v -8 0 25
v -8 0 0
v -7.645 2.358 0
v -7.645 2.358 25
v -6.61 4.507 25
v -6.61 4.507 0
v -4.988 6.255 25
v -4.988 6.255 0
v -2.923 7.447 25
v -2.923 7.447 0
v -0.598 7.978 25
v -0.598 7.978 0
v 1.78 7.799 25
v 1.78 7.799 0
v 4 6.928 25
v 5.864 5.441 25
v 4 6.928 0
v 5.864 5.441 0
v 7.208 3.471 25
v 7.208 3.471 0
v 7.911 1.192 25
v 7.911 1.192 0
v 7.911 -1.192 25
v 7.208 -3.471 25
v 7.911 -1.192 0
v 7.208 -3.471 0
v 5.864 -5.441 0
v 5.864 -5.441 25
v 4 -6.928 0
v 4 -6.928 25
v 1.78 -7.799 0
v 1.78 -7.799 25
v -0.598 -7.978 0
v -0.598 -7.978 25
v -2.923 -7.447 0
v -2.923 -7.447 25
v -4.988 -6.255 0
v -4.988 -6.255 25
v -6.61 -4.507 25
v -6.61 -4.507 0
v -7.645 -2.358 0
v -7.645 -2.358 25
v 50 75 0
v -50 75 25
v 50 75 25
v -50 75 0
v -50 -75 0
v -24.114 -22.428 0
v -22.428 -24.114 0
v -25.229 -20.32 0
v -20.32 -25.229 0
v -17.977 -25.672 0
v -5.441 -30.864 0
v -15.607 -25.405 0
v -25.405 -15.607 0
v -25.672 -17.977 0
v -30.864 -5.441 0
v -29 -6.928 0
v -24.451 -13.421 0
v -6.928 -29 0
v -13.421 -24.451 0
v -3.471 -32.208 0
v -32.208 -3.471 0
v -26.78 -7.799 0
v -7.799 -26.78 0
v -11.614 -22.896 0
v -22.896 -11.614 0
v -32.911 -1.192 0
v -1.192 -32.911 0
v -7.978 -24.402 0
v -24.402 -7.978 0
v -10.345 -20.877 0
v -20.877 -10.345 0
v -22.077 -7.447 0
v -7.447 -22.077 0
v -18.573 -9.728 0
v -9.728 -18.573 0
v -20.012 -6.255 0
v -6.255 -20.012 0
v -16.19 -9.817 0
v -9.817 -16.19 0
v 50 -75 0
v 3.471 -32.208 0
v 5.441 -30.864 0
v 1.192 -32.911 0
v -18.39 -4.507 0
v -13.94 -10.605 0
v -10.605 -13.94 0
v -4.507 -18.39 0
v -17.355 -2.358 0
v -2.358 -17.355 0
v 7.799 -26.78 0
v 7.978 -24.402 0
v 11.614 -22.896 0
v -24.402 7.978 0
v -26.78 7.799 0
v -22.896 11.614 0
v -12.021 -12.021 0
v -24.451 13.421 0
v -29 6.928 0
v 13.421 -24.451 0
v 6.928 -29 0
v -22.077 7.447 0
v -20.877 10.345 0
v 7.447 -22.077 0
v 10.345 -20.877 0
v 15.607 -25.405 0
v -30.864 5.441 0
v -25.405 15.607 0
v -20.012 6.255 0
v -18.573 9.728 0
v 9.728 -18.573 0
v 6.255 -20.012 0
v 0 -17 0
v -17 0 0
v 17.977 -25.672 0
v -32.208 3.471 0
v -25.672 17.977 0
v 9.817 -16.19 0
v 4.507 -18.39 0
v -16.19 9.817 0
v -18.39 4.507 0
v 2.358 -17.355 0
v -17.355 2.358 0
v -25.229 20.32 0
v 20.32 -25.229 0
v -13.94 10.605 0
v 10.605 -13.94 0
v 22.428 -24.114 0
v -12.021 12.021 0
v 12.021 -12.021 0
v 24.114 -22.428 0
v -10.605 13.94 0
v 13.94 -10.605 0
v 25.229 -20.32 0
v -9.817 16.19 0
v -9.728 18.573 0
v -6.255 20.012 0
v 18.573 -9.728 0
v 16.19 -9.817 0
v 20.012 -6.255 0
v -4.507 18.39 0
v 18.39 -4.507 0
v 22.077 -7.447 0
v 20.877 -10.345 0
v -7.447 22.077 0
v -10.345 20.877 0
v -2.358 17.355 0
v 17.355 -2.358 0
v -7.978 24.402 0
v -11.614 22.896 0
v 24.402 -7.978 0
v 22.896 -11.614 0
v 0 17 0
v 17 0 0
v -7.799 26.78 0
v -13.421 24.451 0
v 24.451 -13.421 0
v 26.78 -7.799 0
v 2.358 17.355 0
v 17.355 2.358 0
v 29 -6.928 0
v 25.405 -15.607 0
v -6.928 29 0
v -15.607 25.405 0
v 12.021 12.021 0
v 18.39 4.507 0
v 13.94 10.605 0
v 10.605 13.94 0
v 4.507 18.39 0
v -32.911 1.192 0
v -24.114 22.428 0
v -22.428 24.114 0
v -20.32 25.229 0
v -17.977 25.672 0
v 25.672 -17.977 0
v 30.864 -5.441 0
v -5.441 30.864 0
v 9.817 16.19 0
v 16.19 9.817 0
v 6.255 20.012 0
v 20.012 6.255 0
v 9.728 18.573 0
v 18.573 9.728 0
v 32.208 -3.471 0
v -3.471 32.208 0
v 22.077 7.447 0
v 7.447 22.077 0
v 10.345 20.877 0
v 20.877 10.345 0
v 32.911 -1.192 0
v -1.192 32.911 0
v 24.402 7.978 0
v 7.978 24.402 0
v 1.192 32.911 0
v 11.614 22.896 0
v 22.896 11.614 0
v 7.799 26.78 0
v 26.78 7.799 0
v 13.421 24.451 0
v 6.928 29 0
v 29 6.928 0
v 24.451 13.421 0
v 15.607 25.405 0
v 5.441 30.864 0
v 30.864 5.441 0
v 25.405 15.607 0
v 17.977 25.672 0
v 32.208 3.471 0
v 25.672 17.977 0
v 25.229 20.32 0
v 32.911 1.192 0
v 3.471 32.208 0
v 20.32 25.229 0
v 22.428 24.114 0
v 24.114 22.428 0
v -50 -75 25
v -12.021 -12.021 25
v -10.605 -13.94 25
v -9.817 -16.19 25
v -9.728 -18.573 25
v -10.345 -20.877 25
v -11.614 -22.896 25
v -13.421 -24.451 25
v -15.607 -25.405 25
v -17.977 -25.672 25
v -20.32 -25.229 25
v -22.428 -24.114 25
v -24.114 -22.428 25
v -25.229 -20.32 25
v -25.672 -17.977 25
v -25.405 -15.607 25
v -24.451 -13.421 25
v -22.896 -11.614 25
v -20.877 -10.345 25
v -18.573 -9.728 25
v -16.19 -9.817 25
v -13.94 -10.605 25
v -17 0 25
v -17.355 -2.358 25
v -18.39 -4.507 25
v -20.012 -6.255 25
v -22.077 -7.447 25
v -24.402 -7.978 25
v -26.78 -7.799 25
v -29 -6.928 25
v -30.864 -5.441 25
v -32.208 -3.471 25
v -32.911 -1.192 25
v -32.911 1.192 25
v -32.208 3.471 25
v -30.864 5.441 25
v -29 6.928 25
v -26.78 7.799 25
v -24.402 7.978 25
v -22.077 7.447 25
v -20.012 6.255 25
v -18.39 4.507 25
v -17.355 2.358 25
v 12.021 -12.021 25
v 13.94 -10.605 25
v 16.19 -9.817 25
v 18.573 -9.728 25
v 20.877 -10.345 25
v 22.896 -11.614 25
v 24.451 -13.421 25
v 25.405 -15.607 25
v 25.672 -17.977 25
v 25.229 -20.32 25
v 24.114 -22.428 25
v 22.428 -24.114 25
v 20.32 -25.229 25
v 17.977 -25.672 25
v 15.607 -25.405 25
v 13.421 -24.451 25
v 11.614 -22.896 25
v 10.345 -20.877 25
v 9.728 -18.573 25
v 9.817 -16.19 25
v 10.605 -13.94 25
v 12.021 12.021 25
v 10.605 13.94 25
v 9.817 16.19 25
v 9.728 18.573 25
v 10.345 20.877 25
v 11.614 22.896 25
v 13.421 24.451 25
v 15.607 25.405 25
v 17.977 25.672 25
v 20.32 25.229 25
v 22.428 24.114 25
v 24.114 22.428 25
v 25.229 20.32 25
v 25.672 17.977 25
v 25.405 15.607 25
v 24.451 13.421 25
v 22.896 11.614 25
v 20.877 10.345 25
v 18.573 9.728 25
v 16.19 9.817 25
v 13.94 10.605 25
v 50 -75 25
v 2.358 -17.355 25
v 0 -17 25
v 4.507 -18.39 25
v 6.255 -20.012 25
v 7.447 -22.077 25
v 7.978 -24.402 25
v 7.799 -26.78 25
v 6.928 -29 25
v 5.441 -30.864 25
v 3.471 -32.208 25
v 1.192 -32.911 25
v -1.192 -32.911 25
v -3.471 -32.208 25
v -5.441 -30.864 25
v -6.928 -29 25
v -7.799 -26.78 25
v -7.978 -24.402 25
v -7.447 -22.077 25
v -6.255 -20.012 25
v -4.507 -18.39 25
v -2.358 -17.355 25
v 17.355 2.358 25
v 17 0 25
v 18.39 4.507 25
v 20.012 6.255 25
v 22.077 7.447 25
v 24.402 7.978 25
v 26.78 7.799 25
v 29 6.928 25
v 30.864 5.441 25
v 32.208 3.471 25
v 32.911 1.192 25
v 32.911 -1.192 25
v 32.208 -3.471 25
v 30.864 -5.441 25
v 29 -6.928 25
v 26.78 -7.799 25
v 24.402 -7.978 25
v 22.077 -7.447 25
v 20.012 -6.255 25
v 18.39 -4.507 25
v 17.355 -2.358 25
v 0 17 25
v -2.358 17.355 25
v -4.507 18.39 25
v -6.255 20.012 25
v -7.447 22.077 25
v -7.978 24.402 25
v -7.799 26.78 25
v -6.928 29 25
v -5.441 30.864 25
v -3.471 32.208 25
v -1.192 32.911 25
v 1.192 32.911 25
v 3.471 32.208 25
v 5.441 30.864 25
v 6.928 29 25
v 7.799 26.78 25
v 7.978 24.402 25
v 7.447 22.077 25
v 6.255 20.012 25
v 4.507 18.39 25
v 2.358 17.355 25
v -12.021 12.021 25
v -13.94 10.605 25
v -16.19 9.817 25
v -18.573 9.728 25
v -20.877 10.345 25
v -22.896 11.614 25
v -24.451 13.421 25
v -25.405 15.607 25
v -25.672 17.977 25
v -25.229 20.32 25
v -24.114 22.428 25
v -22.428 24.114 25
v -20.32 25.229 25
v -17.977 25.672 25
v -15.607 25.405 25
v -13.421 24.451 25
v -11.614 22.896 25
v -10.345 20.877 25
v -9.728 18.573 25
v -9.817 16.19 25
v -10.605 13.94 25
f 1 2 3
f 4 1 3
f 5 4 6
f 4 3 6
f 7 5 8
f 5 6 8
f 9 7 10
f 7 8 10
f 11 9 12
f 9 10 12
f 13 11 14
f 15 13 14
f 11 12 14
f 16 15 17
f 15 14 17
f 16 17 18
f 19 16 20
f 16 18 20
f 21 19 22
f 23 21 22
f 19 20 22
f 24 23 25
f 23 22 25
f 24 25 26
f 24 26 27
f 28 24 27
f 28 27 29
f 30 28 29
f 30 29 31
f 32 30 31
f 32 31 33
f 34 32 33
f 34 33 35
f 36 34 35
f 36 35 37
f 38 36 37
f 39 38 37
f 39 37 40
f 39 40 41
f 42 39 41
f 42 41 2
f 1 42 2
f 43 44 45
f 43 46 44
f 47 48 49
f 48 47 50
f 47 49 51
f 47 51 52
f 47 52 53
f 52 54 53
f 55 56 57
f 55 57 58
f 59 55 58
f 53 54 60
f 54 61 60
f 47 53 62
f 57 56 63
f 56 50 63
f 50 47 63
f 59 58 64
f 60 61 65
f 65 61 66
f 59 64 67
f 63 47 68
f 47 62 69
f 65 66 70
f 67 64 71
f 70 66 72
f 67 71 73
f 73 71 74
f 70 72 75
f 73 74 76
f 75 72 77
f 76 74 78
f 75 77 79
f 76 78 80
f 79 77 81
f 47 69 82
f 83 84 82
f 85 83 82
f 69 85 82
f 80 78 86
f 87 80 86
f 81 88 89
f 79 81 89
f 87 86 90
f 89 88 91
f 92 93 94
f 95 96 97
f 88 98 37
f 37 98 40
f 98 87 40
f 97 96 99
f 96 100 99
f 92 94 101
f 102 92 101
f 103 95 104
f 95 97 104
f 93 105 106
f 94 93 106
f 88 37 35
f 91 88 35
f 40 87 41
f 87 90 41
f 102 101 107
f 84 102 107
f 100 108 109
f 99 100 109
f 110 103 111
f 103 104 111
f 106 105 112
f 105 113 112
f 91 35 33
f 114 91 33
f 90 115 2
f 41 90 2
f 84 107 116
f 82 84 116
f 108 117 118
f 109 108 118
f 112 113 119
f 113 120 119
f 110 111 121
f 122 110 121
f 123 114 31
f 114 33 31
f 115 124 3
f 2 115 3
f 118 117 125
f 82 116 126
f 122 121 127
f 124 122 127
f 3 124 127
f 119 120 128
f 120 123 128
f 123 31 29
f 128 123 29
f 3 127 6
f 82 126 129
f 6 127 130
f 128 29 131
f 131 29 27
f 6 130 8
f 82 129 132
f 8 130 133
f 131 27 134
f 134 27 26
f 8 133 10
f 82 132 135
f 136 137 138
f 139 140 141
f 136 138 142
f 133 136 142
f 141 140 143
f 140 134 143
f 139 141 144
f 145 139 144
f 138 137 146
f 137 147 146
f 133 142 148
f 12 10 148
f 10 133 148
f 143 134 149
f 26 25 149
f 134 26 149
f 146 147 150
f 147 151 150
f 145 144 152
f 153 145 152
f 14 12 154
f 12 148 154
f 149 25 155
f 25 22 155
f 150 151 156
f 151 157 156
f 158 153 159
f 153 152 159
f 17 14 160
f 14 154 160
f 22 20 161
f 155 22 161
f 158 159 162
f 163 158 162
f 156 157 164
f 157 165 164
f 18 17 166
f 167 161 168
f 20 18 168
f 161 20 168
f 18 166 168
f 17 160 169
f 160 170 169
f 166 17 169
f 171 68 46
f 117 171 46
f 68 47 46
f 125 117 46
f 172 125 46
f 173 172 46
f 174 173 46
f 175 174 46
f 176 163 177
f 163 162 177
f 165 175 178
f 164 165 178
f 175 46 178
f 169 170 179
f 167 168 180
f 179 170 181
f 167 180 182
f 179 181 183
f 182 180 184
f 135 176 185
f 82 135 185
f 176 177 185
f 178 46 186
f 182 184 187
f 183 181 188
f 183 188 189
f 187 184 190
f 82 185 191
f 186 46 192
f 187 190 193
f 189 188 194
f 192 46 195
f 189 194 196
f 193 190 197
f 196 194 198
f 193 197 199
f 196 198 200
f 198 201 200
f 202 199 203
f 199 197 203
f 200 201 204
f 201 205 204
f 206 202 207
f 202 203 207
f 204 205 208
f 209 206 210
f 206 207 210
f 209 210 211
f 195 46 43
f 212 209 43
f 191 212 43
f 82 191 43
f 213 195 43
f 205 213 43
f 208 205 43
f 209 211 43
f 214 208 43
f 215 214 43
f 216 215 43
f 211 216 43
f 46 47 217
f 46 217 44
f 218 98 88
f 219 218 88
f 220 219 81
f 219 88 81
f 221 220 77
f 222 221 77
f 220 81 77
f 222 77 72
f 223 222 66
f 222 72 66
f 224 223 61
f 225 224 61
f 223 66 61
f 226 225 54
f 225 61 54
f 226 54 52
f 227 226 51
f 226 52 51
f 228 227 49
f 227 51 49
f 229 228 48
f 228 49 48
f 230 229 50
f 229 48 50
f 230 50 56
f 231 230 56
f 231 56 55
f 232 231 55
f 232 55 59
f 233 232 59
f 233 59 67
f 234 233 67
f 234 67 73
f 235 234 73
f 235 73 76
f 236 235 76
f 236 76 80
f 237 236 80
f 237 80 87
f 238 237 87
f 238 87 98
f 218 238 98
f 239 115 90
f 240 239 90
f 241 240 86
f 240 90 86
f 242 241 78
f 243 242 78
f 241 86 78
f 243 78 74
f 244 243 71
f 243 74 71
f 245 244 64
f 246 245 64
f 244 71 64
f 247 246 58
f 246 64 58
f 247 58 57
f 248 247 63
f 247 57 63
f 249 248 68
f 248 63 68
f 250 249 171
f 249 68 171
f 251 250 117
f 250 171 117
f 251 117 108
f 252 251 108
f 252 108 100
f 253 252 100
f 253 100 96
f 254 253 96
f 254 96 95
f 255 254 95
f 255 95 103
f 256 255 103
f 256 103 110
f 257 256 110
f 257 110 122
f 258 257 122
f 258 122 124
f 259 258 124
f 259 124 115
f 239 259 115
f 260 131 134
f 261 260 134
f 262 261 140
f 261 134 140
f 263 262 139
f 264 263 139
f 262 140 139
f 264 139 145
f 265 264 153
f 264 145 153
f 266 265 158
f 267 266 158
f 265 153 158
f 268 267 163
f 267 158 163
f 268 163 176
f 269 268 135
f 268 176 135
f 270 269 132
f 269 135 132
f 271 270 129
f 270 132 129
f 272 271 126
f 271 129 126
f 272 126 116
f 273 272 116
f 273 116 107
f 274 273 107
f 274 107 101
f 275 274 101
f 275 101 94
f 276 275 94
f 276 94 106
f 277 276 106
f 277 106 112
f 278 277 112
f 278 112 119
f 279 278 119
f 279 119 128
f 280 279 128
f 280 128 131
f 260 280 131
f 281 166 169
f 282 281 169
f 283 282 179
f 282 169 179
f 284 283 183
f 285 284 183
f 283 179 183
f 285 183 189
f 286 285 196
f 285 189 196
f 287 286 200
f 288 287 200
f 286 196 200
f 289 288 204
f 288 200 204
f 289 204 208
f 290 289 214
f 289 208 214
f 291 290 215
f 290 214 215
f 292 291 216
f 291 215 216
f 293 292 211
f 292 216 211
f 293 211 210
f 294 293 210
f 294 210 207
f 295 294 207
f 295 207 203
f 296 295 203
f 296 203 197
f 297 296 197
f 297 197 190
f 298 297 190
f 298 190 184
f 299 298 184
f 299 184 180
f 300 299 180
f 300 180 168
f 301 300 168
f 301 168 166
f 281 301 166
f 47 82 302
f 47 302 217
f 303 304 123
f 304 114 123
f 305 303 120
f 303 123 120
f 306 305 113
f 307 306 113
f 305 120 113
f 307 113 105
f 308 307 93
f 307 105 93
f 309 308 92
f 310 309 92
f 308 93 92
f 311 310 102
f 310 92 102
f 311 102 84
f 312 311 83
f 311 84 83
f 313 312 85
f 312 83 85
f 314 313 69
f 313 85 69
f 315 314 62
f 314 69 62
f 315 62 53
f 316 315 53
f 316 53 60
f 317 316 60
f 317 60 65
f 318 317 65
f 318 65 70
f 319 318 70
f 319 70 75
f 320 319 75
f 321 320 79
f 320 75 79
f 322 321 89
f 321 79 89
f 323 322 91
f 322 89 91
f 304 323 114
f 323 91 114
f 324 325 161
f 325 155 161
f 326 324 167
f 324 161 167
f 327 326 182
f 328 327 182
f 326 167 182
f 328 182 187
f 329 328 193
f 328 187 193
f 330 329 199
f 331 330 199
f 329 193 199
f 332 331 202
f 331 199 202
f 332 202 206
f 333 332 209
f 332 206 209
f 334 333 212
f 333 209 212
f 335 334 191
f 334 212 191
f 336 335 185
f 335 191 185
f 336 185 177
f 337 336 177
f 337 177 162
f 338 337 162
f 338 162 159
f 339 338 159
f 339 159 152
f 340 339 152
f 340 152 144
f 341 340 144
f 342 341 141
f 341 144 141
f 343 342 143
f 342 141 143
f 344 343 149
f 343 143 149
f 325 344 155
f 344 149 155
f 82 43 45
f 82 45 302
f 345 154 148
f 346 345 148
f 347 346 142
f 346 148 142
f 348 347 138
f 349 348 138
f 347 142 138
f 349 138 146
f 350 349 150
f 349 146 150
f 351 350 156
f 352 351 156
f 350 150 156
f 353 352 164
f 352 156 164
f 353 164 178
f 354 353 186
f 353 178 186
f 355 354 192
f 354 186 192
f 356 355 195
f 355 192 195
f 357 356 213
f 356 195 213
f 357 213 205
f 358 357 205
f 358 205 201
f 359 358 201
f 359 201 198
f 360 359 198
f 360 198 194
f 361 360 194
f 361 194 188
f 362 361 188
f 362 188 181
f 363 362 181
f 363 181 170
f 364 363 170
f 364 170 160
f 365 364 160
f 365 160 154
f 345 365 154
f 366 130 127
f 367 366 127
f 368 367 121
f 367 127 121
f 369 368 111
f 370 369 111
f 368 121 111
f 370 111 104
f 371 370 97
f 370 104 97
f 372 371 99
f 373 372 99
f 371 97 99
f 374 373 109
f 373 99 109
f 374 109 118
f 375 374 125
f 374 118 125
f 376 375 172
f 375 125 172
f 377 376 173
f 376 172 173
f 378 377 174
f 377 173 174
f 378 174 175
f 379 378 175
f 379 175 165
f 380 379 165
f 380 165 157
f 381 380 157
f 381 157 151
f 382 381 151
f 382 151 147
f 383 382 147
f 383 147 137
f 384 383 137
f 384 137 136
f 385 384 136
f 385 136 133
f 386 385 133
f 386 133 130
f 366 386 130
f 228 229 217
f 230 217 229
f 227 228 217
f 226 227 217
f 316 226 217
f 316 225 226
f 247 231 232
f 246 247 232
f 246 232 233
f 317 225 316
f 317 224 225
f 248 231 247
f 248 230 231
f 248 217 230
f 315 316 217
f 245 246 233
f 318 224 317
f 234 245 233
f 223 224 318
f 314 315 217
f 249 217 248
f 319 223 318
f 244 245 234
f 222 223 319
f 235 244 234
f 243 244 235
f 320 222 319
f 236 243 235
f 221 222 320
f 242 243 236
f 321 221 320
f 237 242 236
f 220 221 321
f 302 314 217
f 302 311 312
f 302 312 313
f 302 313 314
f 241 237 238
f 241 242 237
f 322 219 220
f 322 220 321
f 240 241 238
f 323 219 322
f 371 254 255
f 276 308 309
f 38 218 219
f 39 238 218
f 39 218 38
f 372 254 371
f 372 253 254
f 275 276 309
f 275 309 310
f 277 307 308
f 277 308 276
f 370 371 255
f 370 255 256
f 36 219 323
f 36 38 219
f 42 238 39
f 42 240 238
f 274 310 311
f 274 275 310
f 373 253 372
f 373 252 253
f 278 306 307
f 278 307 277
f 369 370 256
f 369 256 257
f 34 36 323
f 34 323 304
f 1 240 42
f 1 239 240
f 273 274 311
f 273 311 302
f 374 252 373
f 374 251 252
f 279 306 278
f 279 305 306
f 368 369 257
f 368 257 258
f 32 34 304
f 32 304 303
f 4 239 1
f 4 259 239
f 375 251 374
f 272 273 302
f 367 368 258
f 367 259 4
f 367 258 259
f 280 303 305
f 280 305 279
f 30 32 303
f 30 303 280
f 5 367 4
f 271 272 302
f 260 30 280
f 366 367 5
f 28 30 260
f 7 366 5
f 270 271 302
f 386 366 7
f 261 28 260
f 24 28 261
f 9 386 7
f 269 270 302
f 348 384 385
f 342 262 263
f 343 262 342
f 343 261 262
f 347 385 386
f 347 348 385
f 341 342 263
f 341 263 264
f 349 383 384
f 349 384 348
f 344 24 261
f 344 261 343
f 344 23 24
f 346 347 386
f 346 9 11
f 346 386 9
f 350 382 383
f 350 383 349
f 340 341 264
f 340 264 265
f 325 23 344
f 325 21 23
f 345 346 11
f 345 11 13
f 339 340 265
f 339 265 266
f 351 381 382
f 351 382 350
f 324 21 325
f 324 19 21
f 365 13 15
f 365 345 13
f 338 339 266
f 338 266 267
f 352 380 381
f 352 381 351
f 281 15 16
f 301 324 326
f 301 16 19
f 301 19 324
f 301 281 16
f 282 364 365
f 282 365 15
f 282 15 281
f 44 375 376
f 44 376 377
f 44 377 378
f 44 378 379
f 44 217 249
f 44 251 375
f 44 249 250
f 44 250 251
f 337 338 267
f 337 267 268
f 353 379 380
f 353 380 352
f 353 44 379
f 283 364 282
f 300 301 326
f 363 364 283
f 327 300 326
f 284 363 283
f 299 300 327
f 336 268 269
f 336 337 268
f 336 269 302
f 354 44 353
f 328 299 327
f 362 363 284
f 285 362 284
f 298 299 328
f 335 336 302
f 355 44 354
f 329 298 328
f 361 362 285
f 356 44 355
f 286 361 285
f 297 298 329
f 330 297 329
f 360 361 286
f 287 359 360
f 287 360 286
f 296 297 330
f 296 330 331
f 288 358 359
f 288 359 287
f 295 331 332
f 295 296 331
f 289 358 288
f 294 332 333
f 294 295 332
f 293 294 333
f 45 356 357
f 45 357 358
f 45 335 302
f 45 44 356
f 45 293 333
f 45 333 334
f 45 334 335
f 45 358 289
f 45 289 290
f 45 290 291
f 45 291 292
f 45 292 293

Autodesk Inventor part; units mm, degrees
ref_plane "YZ Plane" through (0, 0, 0) normal (1, 0, 0) x (0, 1, 0)
ref_plane "XZ Plane" through (0, 0, 0) normal (0, 1, 0) x (-1, 0, 0)
ref_plane "XY Plane" through (0, 0, 0) normal (0, 0, 1) x (1, 0, 0)
sketch "Sketch1" plane through (0, 0, 0) normal (0, 0, 1) x (1, 0, 0)
  line L0 (-50, 75) -> (50, 75)
  line L1 (50, 75) -> (50, -75)
  line L2 (50, -75) -> (-50, -75)
  line L3 (-50, -75) -> (-50, 75)
  point P0 (0, 0)
  point P1 (0, 75)
  point P2 (-50, 0)
  dimension "d0" = 100
  dimension "d1" = 150
extrude "Extrusion1" add sketch "Sketch1" along normal blind 25
sketch "Sketch2" plane through (0, 0, 0) normal (0, 0, -1) x (-1, 0, 0)
  line L0 (50, -75) -> (-50, -75) projected
  line L1 (-50, 75) -> (50, 75) projected
  line L2 (-50, -75) -> (50, 75) construction
  circle A0 centre (0, 0) radius 8
  line L3 (0, 0) -> (-25, 0) construction
  circle A1 centre (-25, 0) radius 8
  dimension "d4" = 16
  dimension "d5" = 25
  dimension "d6" = 16
extrude "Extrusion2" cut sketch "Sketch2" against normal through all
pattern_circular "Circular Pattern1" count 8 over 360 about axis through (0, 0, 0) along (0, 0, 1) of "Extrusion2"
properties part number "Foam_Top_Big_Mic" material "Polystyrene, Expanded"
